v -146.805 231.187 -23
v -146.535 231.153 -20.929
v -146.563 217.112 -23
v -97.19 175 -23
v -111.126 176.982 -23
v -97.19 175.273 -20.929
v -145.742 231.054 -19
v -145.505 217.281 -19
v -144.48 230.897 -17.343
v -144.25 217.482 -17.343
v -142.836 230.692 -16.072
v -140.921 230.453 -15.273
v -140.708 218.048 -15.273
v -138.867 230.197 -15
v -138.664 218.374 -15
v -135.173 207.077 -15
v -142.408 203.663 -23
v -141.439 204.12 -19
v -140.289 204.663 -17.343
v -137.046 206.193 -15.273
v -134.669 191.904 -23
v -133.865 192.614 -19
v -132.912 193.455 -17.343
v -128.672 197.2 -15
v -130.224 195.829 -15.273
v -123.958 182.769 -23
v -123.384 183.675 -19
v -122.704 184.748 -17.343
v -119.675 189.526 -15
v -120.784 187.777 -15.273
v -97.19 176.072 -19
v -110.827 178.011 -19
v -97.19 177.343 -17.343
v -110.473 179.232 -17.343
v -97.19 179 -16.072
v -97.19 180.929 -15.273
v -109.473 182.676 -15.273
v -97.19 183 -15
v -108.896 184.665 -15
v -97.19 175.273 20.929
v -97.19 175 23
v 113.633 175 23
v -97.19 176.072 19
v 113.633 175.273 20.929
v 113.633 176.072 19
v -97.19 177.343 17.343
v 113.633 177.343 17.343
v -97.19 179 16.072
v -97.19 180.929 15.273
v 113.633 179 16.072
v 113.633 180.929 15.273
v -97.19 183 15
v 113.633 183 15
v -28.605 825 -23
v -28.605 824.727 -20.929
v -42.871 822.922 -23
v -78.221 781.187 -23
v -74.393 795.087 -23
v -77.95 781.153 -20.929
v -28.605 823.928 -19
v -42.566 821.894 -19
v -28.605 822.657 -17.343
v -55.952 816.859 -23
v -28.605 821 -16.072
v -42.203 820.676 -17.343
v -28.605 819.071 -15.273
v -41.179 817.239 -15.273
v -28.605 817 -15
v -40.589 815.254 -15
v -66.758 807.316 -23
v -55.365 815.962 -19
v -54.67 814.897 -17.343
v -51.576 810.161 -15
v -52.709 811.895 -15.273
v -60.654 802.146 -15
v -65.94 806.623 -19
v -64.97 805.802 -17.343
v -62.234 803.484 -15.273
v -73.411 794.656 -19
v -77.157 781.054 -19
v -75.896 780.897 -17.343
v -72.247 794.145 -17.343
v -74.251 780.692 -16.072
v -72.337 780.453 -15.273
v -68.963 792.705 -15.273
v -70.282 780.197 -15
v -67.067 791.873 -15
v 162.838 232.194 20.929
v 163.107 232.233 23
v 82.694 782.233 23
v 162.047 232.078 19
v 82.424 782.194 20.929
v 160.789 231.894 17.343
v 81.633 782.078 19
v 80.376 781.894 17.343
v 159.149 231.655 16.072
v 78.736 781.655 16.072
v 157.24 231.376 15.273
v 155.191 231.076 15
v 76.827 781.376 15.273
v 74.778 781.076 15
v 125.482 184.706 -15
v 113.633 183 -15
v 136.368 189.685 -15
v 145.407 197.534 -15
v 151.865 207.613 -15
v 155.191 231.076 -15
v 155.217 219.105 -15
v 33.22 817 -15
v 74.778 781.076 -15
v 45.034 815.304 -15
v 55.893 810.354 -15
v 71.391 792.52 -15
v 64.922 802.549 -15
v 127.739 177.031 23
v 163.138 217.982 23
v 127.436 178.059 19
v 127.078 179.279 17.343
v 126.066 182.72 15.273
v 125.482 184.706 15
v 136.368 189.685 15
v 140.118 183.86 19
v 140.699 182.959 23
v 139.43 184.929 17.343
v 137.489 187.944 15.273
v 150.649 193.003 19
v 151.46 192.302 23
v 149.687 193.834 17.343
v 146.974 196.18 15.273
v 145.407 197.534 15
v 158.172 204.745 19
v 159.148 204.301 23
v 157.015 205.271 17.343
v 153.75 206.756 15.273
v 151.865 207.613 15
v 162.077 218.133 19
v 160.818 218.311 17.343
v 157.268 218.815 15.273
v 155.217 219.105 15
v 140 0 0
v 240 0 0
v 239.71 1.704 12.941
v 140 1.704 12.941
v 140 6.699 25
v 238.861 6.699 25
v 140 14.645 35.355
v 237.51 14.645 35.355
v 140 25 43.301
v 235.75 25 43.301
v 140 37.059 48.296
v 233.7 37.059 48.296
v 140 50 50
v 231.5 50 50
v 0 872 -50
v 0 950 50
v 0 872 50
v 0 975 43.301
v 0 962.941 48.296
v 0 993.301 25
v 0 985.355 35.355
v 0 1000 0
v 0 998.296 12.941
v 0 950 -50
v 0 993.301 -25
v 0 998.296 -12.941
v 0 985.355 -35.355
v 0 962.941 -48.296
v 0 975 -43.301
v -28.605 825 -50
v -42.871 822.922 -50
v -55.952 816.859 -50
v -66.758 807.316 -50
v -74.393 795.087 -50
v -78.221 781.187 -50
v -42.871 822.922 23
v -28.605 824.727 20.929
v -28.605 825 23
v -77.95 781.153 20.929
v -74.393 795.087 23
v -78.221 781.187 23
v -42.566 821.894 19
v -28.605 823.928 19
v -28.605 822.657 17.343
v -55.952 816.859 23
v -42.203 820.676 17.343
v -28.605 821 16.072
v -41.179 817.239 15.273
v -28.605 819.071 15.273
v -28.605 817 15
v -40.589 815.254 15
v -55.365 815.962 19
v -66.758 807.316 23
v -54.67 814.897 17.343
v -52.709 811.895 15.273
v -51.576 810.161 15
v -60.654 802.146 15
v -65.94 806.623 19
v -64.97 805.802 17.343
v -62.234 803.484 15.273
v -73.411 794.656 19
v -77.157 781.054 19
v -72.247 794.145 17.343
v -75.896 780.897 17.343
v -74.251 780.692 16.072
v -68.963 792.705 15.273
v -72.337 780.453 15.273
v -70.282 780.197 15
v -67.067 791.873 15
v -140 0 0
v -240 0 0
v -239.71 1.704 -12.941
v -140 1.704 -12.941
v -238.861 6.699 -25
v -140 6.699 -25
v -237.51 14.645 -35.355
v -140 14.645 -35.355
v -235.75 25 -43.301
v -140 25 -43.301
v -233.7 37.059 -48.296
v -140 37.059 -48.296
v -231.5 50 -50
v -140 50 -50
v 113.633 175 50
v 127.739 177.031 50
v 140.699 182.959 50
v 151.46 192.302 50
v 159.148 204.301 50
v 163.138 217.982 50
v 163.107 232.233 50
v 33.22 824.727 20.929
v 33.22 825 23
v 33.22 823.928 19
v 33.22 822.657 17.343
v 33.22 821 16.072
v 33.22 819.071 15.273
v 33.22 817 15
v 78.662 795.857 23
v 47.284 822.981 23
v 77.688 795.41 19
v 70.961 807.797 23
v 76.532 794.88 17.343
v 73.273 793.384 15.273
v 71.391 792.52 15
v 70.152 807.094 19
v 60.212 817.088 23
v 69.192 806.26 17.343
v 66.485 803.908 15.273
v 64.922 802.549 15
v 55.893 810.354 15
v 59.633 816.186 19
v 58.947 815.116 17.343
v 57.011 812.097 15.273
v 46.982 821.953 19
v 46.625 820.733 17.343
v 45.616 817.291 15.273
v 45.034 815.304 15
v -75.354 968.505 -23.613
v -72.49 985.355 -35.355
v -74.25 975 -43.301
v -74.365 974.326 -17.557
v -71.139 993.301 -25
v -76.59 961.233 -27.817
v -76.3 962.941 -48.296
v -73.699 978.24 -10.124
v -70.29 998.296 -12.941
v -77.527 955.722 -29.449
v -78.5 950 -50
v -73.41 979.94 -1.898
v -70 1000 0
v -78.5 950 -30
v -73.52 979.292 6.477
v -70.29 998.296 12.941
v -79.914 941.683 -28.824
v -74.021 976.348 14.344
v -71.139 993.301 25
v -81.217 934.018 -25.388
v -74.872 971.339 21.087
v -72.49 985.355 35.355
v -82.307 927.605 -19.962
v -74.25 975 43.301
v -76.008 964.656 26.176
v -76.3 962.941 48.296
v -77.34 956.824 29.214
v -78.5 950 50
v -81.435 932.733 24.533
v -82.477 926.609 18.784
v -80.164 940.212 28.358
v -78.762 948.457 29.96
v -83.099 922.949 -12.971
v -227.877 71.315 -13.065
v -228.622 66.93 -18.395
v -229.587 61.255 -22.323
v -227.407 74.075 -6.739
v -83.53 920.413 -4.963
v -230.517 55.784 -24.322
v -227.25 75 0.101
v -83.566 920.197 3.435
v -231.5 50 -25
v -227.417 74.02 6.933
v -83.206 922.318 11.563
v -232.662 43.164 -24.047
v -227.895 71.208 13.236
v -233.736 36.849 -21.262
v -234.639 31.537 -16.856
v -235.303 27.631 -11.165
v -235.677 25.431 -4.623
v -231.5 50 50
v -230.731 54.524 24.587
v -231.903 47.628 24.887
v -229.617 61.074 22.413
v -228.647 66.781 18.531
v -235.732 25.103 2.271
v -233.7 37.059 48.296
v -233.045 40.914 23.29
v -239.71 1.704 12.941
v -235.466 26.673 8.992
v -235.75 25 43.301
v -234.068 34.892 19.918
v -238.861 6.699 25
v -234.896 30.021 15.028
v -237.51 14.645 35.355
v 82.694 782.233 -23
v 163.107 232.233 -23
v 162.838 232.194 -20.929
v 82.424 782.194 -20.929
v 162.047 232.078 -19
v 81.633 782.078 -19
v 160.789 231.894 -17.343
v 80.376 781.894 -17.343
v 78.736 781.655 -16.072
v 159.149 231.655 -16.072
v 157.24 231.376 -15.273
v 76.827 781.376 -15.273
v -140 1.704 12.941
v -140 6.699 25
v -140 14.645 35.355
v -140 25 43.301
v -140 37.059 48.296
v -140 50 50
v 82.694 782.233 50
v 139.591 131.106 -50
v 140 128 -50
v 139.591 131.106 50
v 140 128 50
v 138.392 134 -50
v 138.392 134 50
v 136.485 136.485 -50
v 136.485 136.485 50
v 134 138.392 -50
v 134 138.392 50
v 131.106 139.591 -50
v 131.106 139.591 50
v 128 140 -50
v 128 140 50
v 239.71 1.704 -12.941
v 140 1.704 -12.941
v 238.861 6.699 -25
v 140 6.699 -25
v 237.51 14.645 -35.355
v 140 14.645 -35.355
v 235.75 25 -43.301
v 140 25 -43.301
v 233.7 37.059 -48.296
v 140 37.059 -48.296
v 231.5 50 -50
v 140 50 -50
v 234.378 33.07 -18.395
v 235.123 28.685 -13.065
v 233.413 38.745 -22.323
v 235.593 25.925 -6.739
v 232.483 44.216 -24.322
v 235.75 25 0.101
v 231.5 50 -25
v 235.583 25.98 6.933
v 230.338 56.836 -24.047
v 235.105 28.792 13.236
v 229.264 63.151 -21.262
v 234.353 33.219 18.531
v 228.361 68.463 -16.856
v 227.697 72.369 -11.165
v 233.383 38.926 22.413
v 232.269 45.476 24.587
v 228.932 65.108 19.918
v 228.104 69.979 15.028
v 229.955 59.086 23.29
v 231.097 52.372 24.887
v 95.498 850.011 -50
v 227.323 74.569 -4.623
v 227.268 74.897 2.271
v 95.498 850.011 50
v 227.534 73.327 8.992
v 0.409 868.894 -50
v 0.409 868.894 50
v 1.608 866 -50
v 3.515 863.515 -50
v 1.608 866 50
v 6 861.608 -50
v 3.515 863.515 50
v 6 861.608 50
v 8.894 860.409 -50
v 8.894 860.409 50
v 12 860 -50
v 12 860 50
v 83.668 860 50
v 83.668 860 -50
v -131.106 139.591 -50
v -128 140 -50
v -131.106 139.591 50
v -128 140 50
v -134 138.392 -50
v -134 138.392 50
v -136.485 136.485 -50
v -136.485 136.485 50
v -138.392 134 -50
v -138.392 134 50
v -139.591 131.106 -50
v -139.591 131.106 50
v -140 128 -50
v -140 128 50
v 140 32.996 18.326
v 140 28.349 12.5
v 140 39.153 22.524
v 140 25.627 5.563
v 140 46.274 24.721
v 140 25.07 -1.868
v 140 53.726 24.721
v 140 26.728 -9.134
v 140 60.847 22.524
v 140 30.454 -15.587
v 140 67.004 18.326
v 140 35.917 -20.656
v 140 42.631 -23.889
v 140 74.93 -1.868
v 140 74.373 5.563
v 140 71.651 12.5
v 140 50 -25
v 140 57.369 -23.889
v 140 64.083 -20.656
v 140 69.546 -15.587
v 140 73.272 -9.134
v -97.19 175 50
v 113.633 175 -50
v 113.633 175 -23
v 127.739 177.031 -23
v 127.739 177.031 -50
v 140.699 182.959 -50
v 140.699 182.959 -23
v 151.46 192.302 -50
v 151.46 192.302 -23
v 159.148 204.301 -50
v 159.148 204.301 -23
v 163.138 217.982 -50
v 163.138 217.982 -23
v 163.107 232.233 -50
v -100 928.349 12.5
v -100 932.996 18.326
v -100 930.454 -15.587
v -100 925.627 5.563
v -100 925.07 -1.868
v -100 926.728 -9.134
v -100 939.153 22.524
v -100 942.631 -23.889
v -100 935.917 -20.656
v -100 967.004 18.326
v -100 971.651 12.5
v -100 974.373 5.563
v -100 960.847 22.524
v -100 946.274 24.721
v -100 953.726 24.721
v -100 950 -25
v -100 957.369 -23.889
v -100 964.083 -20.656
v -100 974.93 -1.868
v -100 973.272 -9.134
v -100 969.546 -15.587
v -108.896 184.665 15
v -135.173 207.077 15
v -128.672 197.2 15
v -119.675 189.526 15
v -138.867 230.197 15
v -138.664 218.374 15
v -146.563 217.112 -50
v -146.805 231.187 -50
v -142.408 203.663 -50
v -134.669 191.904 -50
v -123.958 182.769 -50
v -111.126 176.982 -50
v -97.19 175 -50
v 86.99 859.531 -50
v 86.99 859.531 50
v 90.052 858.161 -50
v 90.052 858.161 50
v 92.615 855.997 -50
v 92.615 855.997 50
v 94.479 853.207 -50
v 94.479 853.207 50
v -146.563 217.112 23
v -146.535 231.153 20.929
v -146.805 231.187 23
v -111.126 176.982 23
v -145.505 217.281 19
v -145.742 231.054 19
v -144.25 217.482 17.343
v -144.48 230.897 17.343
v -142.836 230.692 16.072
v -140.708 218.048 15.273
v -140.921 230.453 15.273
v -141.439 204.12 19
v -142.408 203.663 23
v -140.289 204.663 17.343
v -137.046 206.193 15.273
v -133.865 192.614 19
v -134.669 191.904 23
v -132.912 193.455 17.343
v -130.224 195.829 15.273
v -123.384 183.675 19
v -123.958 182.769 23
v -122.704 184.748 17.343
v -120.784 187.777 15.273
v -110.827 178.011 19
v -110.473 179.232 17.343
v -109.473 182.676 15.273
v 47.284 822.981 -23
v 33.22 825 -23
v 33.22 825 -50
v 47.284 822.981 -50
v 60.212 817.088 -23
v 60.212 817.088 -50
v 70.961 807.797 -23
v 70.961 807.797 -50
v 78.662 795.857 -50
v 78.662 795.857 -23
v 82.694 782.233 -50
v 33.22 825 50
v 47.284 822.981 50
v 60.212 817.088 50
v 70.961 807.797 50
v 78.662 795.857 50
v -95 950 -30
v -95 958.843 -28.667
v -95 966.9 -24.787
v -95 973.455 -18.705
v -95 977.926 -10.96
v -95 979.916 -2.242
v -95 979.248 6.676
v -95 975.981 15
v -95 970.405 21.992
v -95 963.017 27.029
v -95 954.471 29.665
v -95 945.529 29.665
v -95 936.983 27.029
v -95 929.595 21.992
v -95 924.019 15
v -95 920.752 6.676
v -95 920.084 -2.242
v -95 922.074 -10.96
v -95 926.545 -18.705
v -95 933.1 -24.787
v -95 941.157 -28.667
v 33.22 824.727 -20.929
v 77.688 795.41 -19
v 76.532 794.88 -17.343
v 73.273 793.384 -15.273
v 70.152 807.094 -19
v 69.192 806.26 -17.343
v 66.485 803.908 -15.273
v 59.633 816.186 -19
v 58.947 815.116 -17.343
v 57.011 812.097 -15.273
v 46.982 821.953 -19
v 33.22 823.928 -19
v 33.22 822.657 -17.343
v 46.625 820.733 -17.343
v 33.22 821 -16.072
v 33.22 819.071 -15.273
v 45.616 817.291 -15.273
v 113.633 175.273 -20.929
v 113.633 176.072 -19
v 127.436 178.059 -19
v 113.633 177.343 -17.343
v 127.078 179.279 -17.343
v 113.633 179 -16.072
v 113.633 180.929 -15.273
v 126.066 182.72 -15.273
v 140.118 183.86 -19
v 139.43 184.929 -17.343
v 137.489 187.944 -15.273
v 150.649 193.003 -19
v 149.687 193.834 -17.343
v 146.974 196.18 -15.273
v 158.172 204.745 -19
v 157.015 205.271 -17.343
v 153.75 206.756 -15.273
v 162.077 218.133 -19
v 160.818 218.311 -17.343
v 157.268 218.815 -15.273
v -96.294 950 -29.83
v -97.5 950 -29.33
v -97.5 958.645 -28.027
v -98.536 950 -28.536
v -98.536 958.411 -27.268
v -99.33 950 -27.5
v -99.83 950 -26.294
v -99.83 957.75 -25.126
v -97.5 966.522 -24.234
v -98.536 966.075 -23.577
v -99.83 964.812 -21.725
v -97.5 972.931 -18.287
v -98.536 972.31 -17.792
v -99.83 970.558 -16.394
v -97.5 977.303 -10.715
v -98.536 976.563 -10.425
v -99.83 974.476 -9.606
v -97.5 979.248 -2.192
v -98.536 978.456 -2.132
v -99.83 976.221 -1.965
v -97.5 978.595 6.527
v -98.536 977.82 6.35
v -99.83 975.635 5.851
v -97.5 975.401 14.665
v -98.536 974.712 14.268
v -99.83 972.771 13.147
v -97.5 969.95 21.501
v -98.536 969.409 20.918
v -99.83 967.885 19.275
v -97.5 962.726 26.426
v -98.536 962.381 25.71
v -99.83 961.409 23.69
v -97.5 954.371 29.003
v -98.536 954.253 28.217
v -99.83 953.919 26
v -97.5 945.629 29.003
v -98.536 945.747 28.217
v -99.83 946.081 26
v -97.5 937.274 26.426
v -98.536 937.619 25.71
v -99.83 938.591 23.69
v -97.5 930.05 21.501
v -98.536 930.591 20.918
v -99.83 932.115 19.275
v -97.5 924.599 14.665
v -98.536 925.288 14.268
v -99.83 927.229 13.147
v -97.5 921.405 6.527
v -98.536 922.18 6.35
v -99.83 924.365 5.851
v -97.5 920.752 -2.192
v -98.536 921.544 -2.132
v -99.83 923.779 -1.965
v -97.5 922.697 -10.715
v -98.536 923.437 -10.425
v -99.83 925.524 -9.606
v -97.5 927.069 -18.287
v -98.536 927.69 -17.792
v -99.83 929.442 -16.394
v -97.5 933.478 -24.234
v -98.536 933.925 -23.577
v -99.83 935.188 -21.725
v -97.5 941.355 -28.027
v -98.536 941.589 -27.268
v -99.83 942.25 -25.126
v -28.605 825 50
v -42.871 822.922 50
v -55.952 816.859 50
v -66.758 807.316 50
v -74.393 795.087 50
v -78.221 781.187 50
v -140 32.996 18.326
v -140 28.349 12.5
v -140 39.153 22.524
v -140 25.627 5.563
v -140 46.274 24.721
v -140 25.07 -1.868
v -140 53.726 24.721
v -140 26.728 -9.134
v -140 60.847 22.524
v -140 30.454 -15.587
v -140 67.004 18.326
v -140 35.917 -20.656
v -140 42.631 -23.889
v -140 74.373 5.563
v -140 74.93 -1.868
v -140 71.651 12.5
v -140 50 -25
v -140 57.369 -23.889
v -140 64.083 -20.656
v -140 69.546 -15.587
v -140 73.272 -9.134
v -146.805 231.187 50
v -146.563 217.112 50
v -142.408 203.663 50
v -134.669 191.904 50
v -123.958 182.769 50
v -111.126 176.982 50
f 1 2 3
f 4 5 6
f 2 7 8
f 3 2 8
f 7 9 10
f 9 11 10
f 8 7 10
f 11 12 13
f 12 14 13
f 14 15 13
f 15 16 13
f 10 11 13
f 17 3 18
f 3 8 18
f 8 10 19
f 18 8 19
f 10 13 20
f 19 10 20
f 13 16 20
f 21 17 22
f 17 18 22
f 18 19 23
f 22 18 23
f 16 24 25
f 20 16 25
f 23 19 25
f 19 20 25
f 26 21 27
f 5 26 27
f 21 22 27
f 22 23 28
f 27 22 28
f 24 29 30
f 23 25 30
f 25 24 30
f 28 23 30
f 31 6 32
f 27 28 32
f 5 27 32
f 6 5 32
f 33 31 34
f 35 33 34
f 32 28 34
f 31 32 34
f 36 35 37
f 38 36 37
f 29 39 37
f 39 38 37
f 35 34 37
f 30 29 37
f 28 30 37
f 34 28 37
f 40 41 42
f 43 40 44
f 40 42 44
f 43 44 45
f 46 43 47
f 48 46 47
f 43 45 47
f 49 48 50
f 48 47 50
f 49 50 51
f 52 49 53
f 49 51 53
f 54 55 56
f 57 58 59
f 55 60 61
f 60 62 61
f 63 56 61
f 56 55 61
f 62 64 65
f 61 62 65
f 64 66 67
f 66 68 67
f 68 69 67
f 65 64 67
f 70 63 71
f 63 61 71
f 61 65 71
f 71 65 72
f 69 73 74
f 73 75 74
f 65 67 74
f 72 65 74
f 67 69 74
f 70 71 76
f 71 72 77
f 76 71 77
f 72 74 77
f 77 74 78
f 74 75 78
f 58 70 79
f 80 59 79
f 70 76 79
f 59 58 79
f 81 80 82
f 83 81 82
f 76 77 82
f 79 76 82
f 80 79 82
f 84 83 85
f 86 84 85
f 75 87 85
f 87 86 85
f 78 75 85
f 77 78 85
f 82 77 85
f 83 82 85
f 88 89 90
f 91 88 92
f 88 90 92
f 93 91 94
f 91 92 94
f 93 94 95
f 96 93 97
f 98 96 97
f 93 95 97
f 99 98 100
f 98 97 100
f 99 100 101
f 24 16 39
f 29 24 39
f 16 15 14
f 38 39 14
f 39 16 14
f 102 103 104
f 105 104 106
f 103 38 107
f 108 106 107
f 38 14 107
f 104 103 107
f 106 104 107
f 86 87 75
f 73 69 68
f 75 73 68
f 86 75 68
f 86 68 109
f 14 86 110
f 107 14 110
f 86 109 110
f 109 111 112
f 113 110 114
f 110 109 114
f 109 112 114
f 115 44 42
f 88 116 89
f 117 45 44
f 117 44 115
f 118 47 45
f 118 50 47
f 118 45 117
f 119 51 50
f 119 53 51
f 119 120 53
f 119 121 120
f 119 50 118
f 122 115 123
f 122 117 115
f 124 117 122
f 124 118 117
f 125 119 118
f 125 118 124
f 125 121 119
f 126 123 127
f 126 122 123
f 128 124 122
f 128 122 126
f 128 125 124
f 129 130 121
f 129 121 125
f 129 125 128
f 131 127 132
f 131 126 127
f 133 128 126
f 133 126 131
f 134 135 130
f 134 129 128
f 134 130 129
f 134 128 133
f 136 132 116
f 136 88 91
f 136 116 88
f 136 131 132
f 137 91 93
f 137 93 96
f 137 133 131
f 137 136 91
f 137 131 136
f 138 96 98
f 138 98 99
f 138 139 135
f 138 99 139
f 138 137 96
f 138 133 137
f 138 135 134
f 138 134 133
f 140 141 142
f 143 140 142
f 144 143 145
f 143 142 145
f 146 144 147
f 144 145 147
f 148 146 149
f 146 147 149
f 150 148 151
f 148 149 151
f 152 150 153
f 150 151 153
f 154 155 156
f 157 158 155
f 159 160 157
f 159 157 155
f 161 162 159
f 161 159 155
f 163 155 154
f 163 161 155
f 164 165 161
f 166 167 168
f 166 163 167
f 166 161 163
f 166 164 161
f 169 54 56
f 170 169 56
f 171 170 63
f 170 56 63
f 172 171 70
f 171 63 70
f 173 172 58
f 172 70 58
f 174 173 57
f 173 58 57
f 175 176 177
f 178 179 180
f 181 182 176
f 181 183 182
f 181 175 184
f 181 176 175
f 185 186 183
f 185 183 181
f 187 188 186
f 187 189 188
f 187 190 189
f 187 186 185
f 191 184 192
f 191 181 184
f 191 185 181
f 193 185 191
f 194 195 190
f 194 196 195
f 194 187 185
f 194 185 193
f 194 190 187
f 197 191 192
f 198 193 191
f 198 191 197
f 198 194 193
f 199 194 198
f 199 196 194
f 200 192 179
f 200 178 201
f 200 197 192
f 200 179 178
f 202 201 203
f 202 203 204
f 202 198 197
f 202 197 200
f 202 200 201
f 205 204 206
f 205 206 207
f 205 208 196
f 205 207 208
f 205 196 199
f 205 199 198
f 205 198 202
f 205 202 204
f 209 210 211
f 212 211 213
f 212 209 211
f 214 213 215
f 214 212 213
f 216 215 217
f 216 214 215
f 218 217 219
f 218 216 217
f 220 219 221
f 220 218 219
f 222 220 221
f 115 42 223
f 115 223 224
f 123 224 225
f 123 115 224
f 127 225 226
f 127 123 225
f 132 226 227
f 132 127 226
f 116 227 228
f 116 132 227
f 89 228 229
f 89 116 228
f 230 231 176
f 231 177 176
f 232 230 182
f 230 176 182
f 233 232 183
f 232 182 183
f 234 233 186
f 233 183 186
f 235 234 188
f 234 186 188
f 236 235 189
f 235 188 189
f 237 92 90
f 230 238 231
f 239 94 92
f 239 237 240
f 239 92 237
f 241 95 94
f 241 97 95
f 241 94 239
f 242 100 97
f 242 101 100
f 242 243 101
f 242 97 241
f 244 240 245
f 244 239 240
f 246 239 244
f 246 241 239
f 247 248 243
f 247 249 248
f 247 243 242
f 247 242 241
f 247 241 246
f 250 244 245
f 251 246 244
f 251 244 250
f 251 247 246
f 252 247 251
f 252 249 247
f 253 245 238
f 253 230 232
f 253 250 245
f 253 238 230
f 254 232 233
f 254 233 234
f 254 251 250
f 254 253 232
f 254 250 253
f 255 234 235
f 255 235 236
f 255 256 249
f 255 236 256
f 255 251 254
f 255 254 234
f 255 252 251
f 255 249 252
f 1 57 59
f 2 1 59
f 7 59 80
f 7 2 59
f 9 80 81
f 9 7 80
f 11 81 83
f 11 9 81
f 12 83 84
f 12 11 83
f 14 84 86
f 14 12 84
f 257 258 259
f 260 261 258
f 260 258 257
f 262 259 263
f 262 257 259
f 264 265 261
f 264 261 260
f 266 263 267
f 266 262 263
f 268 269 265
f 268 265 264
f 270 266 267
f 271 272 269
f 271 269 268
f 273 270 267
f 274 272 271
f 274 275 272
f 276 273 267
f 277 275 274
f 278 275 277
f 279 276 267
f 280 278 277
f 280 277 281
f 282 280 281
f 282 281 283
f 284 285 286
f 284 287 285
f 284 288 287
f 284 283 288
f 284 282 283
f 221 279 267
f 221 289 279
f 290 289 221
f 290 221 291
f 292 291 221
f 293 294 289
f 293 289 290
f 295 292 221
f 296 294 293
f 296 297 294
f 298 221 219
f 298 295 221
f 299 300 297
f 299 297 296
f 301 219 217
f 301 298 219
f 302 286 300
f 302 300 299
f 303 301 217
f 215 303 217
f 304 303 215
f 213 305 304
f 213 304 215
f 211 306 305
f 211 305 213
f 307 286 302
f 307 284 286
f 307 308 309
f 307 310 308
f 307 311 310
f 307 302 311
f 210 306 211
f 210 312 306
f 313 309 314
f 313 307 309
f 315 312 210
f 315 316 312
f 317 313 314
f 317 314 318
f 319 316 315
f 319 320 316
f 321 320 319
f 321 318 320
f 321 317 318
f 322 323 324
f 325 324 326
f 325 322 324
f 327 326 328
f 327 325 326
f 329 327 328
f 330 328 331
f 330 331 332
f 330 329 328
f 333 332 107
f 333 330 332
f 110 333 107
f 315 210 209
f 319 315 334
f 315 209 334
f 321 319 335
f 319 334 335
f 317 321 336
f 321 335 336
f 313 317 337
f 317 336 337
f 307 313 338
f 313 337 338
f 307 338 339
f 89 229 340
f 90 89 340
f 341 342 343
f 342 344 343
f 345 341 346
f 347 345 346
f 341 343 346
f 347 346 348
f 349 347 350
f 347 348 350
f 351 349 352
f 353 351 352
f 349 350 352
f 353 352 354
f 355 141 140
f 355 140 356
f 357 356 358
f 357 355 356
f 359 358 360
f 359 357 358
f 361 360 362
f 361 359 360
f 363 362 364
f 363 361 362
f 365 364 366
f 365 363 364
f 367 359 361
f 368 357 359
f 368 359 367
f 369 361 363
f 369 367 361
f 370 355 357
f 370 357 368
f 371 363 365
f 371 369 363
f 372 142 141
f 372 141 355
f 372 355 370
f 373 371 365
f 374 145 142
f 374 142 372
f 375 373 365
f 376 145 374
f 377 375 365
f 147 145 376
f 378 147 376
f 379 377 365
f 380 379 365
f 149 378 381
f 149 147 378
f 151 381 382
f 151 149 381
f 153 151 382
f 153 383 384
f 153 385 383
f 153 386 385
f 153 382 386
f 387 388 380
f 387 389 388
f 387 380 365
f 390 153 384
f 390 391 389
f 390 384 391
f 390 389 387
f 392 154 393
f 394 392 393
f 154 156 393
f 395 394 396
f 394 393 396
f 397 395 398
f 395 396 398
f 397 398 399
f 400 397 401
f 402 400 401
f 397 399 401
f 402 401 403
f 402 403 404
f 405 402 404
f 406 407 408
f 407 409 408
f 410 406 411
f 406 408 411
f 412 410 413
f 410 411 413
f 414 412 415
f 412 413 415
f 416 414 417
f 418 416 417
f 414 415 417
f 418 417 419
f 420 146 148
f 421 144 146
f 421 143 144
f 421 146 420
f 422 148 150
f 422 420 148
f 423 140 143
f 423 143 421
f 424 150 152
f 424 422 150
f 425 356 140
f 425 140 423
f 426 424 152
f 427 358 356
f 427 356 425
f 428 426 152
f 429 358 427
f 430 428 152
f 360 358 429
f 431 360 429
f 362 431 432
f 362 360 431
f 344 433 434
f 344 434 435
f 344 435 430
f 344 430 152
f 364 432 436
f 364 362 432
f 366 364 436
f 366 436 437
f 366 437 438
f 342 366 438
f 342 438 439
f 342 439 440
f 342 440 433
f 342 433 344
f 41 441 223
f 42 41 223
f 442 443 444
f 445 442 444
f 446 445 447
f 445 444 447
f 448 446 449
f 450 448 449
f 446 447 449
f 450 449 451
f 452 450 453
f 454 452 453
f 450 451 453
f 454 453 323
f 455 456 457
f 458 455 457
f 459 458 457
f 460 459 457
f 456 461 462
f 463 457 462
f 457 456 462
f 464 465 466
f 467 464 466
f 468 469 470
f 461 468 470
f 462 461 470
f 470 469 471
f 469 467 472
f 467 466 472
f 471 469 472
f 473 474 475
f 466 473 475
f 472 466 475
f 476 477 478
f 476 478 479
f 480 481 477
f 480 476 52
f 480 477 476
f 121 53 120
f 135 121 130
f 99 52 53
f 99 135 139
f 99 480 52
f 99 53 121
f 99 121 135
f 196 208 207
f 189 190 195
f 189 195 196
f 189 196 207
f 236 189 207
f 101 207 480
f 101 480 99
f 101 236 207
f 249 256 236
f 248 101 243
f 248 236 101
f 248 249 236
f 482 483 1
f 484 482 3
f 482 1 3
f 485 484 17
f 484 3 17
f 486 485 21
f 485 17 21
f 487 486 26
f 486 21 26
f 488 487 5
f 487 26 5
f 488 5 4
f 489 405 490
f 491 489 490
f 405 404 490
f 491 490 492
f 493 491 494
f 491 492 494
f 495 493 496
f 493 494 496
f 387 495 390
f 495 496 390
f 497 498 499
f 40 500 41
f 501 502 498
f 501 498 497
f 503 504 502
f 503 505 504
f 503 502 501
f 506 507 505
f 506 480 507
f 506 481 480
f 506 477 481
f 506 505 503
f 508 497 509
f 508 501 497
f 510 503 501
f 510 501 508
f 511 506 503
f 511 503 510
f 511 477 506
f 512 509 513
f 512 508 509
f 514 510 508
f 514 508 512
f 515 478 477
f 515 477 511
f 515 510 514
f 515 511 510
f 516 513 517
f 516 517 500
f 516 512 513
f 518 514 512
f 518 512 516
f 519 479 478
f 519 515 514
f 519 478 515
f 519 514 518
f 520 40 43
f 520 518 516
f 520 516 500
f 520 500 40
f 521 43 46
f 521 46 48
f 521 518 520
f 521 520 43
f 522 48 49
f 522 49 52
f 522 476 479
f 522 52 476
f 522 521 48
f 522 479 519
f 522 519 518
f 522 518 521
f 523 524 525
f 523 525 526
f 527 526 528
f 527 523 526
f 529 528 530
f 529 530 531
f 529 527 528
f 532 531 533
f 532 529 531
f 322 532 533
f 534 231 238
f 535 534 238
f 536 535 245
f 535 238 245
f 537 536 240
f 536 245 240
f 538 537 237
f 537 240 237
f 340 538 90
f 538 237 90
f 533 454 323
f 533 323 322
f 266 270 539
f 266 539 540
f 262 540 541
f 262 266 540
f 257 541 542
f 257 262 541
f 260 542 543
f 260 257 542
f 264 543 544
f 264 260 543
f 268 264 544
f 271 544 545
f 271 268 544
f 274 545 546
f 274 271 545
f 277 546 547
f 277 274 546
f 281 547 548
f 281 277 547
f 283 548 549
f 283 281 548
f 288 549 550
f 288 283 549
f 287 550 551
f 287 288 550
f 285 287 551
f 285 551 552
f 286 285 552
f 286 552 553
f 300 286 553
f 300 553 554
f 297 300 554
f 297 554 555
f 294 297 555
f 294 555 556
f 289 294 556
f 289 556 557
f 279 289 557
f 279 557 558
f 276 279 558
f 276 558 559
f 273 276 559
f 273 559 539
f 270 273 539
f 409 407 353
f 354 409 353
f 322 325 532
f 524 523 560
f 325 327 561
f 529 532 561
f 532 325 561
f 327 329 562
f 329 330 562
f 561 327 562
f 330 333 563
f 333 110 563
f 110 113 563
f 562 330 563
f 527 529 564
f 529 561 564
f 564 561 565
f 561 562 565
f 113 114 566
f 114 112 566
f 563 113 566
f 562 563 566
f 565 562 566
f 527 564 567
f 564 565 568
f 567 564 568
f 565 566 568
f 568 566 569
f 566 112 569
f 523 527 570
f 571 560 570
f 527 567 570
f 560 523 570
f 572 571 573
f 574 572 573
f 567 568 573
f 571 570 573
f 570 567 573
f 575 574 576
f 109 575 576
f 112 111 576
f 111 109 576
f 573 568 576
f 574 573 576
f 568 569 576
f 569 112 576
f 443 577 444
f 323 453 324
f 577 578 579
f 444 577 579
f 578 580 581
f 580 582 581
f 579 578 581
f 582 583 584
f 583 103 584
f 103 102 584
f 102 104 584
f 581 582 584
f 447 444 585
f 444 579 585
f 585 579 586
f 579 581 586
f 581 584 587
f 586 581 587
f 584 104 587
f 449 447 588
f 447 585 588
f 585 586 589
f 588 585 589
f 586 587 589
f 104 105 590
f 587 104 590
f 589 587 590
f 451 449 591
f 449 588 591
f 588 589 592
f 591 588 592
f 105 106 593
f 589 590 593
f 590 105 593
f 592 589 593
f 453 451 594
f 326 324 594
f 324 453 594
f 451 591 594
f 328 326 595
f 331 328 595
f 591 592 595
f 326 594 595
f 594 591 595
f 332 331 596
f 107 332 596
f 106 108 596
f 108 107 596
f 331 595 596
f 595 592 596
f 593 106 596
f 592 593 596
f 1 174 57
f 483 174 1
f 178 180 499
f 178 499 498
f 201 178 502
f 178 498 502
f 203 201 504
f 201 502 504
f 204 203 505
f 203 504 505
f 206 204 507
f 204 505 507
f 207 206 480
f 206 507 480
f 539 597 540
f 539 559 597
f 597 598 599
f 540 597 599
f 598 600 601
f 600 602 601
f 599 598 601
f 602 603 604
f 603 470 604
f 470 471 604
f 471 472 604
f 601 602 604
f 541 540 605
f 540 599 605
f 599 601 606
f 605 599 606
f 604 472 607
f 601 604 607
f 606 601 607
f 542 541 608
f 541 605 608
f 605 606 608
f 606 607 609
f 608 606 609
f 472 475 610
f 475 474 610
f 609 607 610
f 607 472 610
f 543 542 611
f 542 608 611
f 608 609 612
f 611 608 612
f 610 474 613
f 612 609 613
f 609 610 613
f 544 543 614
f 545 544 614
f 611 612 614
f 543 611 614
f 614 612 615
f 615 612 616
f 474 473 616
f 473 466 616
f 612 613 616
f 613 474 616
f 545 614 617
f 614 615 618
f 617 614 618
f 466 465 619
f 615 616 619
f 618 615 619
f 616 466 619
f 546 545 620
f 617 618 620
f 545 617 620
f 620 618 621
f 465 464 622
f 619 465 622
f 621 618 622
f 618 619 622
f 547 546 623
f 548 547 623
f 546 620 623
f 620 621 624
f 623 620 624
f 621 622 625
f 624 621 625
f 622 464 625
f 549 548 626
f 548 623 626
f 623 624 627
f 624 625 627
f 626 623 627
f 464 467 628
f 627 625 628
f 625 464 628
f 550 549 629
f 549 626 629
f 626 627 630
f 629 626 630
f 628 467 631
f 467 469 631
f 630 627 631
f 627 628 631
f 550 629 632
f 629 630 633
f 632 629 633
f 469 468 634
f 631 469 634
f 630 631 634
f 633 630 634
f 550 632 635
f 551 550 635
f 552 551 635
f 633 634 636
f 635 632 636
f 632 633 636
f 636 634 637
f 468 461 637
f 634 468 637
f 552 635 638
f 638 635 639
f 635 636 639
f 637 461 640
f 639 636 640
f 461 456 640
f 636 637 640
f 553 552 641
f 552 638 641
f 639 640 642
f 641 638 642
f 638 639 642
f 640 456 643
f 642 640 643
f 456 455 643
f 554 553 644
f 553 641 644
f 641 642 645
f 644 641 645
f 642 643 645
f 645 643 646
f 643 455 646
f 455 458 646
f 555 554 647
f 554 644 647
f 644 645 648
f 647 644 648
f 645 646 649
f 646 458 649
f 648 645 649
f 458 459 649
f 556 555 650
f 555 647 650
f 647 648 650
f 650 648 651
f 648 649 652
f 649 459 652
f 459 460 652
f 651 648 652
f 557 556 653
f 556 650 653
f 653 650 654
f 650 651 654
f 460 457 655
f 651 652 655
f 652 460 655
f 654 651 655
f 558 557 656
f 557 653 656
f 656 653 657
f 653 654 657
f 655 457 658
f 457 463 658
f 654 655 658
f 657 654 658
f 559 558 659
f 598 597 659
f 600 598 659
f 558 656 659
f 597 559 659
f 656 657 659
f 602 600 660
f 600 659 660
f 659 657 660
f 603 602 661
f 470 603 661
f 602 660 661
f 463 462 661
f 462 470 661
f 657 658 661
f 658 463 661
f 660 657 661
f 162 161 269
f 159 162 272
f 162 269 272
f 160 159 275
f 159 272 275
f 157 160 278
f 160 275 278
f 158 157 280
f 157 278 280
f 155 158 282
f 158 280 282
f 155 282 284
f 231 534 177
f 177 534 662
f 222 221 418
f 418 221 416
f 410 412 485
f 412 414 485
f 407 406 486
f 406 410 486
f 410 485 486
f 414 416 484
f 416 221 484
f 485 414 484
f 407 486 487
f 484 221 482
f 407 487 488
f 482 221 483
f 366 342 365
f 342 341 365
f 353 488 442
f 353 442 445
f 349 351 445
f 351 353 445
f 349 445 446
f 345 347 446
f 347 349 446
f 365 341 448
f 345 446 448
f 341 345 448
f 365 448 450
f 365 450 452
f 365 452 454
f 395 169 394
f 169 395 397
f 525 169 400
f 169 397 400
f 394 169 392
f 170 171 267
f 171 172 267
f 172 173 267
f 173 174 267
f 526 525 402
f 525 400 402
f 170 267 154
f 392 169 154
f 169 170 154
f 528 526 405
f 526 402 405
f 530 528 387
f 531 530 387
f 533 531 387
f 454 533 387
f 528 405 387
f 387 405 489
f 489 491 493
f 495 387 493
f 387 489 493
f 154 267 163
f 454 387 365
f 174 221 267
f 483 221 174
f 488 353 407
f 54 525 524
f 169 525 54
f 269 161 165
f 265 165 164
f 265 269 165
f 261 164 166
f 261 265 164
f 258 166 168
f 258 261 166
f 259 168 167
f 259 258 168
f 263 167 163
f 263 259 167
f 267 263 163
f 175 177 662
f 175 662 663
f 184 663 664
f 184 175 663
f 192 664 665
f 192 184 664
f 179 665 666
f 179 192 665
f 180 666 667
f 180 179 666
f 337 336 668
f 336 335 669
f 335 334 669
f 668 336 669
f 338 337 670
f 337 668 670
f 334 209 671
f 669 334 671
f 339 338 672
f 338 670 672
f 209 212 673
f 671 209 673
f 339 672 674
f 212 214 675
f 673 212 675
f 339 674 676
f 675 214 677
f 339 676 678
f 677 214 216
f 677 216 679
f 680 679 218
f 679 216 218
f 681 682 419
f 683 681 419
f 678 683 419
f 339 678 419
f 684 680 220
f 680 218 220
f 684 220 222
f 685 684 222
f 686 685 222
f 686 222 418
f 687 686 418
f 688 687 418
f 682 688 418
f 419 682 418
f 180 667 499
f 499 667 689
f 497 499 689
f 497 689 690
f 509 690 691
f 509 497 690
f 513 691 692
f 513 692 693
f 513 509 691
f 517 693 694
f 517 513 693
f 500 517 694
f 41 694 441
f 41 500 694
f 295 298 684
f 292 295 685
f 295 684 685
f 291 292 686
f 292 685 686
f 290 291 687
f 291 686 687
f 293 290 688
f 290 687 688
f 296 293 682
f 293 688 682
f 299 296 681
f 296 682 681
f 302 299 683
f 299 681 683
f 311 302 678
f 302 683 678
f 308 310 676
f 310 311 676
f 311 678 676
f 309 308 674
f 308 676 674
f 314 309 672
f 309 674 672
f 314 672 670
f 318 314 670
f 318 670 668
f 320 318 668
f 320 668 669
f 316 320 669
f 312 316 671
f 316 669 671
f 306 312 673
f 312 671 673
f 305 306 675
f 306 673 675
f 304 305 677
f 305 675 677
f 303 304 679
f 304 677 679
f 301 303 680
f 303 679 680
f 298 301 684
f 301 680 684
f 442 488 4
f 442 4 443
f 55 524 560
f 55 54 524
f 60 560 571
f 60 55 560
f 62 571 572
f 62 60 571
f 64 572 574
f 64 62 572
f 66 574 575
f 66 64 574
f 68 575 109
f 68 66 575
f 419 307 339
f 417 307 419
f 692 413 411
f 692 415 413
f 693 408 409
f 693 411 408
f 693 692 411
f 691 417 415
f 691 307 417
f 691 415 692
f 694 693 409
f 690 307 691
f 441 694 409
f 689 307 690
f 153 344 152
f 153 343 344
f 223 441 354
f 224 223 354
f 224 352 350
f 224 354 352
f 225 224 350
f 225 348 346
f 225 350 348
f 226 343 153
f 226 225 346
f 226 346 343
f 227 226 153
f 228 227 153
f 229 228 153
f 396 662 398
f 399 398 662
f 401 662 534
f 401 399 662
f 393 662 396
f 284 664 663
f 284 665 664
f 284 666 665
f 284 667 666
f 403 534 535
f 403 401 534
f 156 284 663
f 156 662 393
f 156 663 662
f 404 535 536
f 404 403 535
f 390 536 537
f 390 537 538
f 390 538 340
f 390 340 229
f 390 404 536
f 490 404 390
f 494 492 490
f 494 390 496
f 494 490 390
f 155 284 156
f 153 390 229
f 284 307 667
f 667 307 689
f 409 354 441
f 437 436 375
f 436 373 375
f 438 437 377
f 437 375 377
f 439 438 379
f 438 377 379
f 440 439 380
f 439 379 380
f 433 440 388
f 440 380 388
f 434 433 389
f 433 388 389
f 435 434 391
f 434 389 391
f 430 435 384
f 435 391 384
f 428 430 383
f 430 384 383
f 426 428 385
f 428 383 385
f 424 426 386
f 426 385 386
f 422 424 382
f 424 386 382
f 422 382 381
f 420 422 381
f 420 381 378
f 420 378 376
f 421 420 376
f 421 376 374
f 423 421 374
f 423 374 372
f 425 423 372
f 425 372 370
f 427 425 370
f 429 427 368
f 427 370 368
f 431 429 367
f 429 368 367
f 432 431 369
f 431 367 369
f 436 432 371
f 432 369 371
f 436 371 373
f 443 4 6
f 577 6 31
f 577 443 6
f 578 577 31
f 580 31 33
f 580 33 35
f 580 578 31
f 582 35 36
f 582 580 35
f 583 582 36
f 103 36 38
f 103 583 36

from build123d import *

# Parameters (mm, degrees)
BOSS_EXTRUDE1_DEPTH     = 50
FILLET1_R               = 50
CUT_EXTRUDE2_DEPTH      = 1030.611577246
CUT_EXTRUDE2_DEPTH_BACK = 1030.611577246
SKETCH4_W               = 280
SKETCH4_H               = 140
SKETCH4_W_2             = 94
SKETCH5_R               = 30
BOSS_EXTRUDE2_DEPTH     = 100
FILLET2_R               = 5
FILLET3_R               = 12
CUT_EXTRUDE4_DEPTH      = 35
FILLET4_R               = 50
FILLET5_R               = 8
FILLET4_OF_MIRROR1_R    = 50
FILLET5_OF_MIRROR1_R    = 8
SKETCH7_R               = 25
CUT_EXTRUDE5_DEPTH      = 250


with BuildPart() as part:
    # Sketch1 → Boss-Extrude1 (new, symmetric)
    with BuildSketch(Plane.XY):
        Polygon((-240, 0), (240, 0), (70, 1000), (-70, 1000), align=None)
    extrude(amount=BOSS_EXTRUDE1_DEPTH, both=True)

    # Fillet1
    fillet1_edges = [part.edges().sort_by_distance(p)[0] for p in [
        (0, 1000, 50),
        (0, 1000, -50),
        (0, 0, 50),
        (0, 0, -50),
    ]]
    fillet(fillet1_edges, radius=FILLET1_R - 0.0001)  # a hair under: the kernel refuses the full size

    # Sketch4 → Cut-Extrude2 (cut, two sides: drawn at the far end of the back side and taken through both)
    with BuildSketch(Plane.XY.offset(-CUT_EXTRUDE2_DEPTH_BACK)):
        with Locations((0, 70)):
            Rectangle(SKETCH4_W, SKETCH4_H)
        with Locations((47, 930)):
            Rectangle(SKETCH4_W_2, SKETCH4_H)
    extrude(amount=CUT_EXTRUDE2_DEPTH + CUT_EXTRUDE2_DEPTH_BACK, mode=Mode.SUBTRACT)

    # Sketch5 → Boss-Extrude2 (add)
    with BuildSketch(Plane(origin=(0, 0, 0), x_dir=(0, 0, -1), z_dir=(1, 0, 0))):
        with Locations((0, 950)):
            Circle(SKETCH5_R)
    extrude(amount=-BOSS_EXTRUDE2_DEPTH)

    # Fillet2
    fillet2_edges = [part.edges().sort_by_distance(p)[0] for p in [
        (-100, 950, 30),
    ]]
    fillet(fillet2_edges, radius=FILLET2_R)

    # Fillet3
    fillet3_edges = [part.edges().sort_by_distance(p)[0] for p in [
        (-140, 140, 0),
        (140, 140, 0),
        (93.8, 860, 0),
        (0, 860, 0),
    ]]
    fillet(fillet3_edges, radius=FILLET3_R)

    # Sketch6 → Cut-Extrude4 (cut)
    with BuildSketch(Plane.XY.offset(50)):
        Polygon((76.441272438, 825), (-72.757259745, 825), (-153.811728433, 175), (171.475101543, 175), align=None)
    cut_extrude4 = extrude(amount=-CUT_EXTRUDE4_DEPTH, mode=Mode.SUBTRACT)

    # Fillet4
    fillet4_edges = [part.edges().sort_by_distance(p)[0] for p in [
        (76.441272438, 825, 32.5),
        (171.475101543, 175, 32.5),
        (-153.811728433, 175, 32.5),
        (-72.757259745, 825, 32.5),
    ]]
    fillet(fillet4_edges, radius=FILLET4_R)

    # Fillet5
    fillet5_edges = [part.edges().sort_by_distance(p)[0] for p in [
        (122.900622431, 507.233392258, 15),
        (8.221853466, 175, 15),
        (2.307508674, 825, 15),
        (-112.512975158, 506.187040802, 15),
        (-61.700650501, 812.479007725, 15),
        (65.918080265, 812.826377126, 15),
        (-134.668529482, 191.904320827, 15),
        (151.459605814, 192.301908411, 15),
    ]]
    fillet(fillet5_edges, radius=FILLET5_R)

    # Mirror1: Cut-Extrude4 across plane
    add(cut_extrude4.mirror(Plane.XY), mode=Mode.SUBTRACT)

    # Fillet4 of Mirror1
    fillet4_of_mirror1_edges = [part.edges().sort_by_distance(p)[0] for p in [
        (76.441272438, 825, -32.5),
        (171.475101543, 175, -32.5),
        (-153.811728433, 175, -32.5),
        (-72.757259745, 825, -32.5),
    ]]
    fillet(fillet4_of_mirror1_edges, radius=FILLET4_OF_MIRROR1_R)

    # Fillet5 of Mirror1
    fillet5_of_mirror1_edges = [part.edges().sort_by_distance(p)[0] for p in [
        (122.900622431, 507.233392258, -15),
        (8.221853466, 175, -15),
        (2.307508674, 825, -15),
        (-112.512975158, 506.187040802, -15),
        (-61.700650501, 812.479007725, -15),
        (65.918080265, 812.826377126, -15),
        (-134.668529482, 191.904320827, -15),
        (151.459605814, 192.301908411, -15),
    ]]
    fillet(fillet5_of_mirror1_edges, radius=FILLET5_OF_MIRROR1_R)

    # Sketch7 → Cut-Extrude5 (cut, symmetric)
    with BuildSketch(Plane(origin=(0, 0, 0), x_dir=(0, 0, -1), z_dir=(1, 0, 0))):
        with Locations((0, 50)):
            Circle(SKETCH7_R)
    extrude(amount=CUT_EXTRUDE5_DEPTH, both=True, mode=Mode.SUBTRACT)


solid = part.part
